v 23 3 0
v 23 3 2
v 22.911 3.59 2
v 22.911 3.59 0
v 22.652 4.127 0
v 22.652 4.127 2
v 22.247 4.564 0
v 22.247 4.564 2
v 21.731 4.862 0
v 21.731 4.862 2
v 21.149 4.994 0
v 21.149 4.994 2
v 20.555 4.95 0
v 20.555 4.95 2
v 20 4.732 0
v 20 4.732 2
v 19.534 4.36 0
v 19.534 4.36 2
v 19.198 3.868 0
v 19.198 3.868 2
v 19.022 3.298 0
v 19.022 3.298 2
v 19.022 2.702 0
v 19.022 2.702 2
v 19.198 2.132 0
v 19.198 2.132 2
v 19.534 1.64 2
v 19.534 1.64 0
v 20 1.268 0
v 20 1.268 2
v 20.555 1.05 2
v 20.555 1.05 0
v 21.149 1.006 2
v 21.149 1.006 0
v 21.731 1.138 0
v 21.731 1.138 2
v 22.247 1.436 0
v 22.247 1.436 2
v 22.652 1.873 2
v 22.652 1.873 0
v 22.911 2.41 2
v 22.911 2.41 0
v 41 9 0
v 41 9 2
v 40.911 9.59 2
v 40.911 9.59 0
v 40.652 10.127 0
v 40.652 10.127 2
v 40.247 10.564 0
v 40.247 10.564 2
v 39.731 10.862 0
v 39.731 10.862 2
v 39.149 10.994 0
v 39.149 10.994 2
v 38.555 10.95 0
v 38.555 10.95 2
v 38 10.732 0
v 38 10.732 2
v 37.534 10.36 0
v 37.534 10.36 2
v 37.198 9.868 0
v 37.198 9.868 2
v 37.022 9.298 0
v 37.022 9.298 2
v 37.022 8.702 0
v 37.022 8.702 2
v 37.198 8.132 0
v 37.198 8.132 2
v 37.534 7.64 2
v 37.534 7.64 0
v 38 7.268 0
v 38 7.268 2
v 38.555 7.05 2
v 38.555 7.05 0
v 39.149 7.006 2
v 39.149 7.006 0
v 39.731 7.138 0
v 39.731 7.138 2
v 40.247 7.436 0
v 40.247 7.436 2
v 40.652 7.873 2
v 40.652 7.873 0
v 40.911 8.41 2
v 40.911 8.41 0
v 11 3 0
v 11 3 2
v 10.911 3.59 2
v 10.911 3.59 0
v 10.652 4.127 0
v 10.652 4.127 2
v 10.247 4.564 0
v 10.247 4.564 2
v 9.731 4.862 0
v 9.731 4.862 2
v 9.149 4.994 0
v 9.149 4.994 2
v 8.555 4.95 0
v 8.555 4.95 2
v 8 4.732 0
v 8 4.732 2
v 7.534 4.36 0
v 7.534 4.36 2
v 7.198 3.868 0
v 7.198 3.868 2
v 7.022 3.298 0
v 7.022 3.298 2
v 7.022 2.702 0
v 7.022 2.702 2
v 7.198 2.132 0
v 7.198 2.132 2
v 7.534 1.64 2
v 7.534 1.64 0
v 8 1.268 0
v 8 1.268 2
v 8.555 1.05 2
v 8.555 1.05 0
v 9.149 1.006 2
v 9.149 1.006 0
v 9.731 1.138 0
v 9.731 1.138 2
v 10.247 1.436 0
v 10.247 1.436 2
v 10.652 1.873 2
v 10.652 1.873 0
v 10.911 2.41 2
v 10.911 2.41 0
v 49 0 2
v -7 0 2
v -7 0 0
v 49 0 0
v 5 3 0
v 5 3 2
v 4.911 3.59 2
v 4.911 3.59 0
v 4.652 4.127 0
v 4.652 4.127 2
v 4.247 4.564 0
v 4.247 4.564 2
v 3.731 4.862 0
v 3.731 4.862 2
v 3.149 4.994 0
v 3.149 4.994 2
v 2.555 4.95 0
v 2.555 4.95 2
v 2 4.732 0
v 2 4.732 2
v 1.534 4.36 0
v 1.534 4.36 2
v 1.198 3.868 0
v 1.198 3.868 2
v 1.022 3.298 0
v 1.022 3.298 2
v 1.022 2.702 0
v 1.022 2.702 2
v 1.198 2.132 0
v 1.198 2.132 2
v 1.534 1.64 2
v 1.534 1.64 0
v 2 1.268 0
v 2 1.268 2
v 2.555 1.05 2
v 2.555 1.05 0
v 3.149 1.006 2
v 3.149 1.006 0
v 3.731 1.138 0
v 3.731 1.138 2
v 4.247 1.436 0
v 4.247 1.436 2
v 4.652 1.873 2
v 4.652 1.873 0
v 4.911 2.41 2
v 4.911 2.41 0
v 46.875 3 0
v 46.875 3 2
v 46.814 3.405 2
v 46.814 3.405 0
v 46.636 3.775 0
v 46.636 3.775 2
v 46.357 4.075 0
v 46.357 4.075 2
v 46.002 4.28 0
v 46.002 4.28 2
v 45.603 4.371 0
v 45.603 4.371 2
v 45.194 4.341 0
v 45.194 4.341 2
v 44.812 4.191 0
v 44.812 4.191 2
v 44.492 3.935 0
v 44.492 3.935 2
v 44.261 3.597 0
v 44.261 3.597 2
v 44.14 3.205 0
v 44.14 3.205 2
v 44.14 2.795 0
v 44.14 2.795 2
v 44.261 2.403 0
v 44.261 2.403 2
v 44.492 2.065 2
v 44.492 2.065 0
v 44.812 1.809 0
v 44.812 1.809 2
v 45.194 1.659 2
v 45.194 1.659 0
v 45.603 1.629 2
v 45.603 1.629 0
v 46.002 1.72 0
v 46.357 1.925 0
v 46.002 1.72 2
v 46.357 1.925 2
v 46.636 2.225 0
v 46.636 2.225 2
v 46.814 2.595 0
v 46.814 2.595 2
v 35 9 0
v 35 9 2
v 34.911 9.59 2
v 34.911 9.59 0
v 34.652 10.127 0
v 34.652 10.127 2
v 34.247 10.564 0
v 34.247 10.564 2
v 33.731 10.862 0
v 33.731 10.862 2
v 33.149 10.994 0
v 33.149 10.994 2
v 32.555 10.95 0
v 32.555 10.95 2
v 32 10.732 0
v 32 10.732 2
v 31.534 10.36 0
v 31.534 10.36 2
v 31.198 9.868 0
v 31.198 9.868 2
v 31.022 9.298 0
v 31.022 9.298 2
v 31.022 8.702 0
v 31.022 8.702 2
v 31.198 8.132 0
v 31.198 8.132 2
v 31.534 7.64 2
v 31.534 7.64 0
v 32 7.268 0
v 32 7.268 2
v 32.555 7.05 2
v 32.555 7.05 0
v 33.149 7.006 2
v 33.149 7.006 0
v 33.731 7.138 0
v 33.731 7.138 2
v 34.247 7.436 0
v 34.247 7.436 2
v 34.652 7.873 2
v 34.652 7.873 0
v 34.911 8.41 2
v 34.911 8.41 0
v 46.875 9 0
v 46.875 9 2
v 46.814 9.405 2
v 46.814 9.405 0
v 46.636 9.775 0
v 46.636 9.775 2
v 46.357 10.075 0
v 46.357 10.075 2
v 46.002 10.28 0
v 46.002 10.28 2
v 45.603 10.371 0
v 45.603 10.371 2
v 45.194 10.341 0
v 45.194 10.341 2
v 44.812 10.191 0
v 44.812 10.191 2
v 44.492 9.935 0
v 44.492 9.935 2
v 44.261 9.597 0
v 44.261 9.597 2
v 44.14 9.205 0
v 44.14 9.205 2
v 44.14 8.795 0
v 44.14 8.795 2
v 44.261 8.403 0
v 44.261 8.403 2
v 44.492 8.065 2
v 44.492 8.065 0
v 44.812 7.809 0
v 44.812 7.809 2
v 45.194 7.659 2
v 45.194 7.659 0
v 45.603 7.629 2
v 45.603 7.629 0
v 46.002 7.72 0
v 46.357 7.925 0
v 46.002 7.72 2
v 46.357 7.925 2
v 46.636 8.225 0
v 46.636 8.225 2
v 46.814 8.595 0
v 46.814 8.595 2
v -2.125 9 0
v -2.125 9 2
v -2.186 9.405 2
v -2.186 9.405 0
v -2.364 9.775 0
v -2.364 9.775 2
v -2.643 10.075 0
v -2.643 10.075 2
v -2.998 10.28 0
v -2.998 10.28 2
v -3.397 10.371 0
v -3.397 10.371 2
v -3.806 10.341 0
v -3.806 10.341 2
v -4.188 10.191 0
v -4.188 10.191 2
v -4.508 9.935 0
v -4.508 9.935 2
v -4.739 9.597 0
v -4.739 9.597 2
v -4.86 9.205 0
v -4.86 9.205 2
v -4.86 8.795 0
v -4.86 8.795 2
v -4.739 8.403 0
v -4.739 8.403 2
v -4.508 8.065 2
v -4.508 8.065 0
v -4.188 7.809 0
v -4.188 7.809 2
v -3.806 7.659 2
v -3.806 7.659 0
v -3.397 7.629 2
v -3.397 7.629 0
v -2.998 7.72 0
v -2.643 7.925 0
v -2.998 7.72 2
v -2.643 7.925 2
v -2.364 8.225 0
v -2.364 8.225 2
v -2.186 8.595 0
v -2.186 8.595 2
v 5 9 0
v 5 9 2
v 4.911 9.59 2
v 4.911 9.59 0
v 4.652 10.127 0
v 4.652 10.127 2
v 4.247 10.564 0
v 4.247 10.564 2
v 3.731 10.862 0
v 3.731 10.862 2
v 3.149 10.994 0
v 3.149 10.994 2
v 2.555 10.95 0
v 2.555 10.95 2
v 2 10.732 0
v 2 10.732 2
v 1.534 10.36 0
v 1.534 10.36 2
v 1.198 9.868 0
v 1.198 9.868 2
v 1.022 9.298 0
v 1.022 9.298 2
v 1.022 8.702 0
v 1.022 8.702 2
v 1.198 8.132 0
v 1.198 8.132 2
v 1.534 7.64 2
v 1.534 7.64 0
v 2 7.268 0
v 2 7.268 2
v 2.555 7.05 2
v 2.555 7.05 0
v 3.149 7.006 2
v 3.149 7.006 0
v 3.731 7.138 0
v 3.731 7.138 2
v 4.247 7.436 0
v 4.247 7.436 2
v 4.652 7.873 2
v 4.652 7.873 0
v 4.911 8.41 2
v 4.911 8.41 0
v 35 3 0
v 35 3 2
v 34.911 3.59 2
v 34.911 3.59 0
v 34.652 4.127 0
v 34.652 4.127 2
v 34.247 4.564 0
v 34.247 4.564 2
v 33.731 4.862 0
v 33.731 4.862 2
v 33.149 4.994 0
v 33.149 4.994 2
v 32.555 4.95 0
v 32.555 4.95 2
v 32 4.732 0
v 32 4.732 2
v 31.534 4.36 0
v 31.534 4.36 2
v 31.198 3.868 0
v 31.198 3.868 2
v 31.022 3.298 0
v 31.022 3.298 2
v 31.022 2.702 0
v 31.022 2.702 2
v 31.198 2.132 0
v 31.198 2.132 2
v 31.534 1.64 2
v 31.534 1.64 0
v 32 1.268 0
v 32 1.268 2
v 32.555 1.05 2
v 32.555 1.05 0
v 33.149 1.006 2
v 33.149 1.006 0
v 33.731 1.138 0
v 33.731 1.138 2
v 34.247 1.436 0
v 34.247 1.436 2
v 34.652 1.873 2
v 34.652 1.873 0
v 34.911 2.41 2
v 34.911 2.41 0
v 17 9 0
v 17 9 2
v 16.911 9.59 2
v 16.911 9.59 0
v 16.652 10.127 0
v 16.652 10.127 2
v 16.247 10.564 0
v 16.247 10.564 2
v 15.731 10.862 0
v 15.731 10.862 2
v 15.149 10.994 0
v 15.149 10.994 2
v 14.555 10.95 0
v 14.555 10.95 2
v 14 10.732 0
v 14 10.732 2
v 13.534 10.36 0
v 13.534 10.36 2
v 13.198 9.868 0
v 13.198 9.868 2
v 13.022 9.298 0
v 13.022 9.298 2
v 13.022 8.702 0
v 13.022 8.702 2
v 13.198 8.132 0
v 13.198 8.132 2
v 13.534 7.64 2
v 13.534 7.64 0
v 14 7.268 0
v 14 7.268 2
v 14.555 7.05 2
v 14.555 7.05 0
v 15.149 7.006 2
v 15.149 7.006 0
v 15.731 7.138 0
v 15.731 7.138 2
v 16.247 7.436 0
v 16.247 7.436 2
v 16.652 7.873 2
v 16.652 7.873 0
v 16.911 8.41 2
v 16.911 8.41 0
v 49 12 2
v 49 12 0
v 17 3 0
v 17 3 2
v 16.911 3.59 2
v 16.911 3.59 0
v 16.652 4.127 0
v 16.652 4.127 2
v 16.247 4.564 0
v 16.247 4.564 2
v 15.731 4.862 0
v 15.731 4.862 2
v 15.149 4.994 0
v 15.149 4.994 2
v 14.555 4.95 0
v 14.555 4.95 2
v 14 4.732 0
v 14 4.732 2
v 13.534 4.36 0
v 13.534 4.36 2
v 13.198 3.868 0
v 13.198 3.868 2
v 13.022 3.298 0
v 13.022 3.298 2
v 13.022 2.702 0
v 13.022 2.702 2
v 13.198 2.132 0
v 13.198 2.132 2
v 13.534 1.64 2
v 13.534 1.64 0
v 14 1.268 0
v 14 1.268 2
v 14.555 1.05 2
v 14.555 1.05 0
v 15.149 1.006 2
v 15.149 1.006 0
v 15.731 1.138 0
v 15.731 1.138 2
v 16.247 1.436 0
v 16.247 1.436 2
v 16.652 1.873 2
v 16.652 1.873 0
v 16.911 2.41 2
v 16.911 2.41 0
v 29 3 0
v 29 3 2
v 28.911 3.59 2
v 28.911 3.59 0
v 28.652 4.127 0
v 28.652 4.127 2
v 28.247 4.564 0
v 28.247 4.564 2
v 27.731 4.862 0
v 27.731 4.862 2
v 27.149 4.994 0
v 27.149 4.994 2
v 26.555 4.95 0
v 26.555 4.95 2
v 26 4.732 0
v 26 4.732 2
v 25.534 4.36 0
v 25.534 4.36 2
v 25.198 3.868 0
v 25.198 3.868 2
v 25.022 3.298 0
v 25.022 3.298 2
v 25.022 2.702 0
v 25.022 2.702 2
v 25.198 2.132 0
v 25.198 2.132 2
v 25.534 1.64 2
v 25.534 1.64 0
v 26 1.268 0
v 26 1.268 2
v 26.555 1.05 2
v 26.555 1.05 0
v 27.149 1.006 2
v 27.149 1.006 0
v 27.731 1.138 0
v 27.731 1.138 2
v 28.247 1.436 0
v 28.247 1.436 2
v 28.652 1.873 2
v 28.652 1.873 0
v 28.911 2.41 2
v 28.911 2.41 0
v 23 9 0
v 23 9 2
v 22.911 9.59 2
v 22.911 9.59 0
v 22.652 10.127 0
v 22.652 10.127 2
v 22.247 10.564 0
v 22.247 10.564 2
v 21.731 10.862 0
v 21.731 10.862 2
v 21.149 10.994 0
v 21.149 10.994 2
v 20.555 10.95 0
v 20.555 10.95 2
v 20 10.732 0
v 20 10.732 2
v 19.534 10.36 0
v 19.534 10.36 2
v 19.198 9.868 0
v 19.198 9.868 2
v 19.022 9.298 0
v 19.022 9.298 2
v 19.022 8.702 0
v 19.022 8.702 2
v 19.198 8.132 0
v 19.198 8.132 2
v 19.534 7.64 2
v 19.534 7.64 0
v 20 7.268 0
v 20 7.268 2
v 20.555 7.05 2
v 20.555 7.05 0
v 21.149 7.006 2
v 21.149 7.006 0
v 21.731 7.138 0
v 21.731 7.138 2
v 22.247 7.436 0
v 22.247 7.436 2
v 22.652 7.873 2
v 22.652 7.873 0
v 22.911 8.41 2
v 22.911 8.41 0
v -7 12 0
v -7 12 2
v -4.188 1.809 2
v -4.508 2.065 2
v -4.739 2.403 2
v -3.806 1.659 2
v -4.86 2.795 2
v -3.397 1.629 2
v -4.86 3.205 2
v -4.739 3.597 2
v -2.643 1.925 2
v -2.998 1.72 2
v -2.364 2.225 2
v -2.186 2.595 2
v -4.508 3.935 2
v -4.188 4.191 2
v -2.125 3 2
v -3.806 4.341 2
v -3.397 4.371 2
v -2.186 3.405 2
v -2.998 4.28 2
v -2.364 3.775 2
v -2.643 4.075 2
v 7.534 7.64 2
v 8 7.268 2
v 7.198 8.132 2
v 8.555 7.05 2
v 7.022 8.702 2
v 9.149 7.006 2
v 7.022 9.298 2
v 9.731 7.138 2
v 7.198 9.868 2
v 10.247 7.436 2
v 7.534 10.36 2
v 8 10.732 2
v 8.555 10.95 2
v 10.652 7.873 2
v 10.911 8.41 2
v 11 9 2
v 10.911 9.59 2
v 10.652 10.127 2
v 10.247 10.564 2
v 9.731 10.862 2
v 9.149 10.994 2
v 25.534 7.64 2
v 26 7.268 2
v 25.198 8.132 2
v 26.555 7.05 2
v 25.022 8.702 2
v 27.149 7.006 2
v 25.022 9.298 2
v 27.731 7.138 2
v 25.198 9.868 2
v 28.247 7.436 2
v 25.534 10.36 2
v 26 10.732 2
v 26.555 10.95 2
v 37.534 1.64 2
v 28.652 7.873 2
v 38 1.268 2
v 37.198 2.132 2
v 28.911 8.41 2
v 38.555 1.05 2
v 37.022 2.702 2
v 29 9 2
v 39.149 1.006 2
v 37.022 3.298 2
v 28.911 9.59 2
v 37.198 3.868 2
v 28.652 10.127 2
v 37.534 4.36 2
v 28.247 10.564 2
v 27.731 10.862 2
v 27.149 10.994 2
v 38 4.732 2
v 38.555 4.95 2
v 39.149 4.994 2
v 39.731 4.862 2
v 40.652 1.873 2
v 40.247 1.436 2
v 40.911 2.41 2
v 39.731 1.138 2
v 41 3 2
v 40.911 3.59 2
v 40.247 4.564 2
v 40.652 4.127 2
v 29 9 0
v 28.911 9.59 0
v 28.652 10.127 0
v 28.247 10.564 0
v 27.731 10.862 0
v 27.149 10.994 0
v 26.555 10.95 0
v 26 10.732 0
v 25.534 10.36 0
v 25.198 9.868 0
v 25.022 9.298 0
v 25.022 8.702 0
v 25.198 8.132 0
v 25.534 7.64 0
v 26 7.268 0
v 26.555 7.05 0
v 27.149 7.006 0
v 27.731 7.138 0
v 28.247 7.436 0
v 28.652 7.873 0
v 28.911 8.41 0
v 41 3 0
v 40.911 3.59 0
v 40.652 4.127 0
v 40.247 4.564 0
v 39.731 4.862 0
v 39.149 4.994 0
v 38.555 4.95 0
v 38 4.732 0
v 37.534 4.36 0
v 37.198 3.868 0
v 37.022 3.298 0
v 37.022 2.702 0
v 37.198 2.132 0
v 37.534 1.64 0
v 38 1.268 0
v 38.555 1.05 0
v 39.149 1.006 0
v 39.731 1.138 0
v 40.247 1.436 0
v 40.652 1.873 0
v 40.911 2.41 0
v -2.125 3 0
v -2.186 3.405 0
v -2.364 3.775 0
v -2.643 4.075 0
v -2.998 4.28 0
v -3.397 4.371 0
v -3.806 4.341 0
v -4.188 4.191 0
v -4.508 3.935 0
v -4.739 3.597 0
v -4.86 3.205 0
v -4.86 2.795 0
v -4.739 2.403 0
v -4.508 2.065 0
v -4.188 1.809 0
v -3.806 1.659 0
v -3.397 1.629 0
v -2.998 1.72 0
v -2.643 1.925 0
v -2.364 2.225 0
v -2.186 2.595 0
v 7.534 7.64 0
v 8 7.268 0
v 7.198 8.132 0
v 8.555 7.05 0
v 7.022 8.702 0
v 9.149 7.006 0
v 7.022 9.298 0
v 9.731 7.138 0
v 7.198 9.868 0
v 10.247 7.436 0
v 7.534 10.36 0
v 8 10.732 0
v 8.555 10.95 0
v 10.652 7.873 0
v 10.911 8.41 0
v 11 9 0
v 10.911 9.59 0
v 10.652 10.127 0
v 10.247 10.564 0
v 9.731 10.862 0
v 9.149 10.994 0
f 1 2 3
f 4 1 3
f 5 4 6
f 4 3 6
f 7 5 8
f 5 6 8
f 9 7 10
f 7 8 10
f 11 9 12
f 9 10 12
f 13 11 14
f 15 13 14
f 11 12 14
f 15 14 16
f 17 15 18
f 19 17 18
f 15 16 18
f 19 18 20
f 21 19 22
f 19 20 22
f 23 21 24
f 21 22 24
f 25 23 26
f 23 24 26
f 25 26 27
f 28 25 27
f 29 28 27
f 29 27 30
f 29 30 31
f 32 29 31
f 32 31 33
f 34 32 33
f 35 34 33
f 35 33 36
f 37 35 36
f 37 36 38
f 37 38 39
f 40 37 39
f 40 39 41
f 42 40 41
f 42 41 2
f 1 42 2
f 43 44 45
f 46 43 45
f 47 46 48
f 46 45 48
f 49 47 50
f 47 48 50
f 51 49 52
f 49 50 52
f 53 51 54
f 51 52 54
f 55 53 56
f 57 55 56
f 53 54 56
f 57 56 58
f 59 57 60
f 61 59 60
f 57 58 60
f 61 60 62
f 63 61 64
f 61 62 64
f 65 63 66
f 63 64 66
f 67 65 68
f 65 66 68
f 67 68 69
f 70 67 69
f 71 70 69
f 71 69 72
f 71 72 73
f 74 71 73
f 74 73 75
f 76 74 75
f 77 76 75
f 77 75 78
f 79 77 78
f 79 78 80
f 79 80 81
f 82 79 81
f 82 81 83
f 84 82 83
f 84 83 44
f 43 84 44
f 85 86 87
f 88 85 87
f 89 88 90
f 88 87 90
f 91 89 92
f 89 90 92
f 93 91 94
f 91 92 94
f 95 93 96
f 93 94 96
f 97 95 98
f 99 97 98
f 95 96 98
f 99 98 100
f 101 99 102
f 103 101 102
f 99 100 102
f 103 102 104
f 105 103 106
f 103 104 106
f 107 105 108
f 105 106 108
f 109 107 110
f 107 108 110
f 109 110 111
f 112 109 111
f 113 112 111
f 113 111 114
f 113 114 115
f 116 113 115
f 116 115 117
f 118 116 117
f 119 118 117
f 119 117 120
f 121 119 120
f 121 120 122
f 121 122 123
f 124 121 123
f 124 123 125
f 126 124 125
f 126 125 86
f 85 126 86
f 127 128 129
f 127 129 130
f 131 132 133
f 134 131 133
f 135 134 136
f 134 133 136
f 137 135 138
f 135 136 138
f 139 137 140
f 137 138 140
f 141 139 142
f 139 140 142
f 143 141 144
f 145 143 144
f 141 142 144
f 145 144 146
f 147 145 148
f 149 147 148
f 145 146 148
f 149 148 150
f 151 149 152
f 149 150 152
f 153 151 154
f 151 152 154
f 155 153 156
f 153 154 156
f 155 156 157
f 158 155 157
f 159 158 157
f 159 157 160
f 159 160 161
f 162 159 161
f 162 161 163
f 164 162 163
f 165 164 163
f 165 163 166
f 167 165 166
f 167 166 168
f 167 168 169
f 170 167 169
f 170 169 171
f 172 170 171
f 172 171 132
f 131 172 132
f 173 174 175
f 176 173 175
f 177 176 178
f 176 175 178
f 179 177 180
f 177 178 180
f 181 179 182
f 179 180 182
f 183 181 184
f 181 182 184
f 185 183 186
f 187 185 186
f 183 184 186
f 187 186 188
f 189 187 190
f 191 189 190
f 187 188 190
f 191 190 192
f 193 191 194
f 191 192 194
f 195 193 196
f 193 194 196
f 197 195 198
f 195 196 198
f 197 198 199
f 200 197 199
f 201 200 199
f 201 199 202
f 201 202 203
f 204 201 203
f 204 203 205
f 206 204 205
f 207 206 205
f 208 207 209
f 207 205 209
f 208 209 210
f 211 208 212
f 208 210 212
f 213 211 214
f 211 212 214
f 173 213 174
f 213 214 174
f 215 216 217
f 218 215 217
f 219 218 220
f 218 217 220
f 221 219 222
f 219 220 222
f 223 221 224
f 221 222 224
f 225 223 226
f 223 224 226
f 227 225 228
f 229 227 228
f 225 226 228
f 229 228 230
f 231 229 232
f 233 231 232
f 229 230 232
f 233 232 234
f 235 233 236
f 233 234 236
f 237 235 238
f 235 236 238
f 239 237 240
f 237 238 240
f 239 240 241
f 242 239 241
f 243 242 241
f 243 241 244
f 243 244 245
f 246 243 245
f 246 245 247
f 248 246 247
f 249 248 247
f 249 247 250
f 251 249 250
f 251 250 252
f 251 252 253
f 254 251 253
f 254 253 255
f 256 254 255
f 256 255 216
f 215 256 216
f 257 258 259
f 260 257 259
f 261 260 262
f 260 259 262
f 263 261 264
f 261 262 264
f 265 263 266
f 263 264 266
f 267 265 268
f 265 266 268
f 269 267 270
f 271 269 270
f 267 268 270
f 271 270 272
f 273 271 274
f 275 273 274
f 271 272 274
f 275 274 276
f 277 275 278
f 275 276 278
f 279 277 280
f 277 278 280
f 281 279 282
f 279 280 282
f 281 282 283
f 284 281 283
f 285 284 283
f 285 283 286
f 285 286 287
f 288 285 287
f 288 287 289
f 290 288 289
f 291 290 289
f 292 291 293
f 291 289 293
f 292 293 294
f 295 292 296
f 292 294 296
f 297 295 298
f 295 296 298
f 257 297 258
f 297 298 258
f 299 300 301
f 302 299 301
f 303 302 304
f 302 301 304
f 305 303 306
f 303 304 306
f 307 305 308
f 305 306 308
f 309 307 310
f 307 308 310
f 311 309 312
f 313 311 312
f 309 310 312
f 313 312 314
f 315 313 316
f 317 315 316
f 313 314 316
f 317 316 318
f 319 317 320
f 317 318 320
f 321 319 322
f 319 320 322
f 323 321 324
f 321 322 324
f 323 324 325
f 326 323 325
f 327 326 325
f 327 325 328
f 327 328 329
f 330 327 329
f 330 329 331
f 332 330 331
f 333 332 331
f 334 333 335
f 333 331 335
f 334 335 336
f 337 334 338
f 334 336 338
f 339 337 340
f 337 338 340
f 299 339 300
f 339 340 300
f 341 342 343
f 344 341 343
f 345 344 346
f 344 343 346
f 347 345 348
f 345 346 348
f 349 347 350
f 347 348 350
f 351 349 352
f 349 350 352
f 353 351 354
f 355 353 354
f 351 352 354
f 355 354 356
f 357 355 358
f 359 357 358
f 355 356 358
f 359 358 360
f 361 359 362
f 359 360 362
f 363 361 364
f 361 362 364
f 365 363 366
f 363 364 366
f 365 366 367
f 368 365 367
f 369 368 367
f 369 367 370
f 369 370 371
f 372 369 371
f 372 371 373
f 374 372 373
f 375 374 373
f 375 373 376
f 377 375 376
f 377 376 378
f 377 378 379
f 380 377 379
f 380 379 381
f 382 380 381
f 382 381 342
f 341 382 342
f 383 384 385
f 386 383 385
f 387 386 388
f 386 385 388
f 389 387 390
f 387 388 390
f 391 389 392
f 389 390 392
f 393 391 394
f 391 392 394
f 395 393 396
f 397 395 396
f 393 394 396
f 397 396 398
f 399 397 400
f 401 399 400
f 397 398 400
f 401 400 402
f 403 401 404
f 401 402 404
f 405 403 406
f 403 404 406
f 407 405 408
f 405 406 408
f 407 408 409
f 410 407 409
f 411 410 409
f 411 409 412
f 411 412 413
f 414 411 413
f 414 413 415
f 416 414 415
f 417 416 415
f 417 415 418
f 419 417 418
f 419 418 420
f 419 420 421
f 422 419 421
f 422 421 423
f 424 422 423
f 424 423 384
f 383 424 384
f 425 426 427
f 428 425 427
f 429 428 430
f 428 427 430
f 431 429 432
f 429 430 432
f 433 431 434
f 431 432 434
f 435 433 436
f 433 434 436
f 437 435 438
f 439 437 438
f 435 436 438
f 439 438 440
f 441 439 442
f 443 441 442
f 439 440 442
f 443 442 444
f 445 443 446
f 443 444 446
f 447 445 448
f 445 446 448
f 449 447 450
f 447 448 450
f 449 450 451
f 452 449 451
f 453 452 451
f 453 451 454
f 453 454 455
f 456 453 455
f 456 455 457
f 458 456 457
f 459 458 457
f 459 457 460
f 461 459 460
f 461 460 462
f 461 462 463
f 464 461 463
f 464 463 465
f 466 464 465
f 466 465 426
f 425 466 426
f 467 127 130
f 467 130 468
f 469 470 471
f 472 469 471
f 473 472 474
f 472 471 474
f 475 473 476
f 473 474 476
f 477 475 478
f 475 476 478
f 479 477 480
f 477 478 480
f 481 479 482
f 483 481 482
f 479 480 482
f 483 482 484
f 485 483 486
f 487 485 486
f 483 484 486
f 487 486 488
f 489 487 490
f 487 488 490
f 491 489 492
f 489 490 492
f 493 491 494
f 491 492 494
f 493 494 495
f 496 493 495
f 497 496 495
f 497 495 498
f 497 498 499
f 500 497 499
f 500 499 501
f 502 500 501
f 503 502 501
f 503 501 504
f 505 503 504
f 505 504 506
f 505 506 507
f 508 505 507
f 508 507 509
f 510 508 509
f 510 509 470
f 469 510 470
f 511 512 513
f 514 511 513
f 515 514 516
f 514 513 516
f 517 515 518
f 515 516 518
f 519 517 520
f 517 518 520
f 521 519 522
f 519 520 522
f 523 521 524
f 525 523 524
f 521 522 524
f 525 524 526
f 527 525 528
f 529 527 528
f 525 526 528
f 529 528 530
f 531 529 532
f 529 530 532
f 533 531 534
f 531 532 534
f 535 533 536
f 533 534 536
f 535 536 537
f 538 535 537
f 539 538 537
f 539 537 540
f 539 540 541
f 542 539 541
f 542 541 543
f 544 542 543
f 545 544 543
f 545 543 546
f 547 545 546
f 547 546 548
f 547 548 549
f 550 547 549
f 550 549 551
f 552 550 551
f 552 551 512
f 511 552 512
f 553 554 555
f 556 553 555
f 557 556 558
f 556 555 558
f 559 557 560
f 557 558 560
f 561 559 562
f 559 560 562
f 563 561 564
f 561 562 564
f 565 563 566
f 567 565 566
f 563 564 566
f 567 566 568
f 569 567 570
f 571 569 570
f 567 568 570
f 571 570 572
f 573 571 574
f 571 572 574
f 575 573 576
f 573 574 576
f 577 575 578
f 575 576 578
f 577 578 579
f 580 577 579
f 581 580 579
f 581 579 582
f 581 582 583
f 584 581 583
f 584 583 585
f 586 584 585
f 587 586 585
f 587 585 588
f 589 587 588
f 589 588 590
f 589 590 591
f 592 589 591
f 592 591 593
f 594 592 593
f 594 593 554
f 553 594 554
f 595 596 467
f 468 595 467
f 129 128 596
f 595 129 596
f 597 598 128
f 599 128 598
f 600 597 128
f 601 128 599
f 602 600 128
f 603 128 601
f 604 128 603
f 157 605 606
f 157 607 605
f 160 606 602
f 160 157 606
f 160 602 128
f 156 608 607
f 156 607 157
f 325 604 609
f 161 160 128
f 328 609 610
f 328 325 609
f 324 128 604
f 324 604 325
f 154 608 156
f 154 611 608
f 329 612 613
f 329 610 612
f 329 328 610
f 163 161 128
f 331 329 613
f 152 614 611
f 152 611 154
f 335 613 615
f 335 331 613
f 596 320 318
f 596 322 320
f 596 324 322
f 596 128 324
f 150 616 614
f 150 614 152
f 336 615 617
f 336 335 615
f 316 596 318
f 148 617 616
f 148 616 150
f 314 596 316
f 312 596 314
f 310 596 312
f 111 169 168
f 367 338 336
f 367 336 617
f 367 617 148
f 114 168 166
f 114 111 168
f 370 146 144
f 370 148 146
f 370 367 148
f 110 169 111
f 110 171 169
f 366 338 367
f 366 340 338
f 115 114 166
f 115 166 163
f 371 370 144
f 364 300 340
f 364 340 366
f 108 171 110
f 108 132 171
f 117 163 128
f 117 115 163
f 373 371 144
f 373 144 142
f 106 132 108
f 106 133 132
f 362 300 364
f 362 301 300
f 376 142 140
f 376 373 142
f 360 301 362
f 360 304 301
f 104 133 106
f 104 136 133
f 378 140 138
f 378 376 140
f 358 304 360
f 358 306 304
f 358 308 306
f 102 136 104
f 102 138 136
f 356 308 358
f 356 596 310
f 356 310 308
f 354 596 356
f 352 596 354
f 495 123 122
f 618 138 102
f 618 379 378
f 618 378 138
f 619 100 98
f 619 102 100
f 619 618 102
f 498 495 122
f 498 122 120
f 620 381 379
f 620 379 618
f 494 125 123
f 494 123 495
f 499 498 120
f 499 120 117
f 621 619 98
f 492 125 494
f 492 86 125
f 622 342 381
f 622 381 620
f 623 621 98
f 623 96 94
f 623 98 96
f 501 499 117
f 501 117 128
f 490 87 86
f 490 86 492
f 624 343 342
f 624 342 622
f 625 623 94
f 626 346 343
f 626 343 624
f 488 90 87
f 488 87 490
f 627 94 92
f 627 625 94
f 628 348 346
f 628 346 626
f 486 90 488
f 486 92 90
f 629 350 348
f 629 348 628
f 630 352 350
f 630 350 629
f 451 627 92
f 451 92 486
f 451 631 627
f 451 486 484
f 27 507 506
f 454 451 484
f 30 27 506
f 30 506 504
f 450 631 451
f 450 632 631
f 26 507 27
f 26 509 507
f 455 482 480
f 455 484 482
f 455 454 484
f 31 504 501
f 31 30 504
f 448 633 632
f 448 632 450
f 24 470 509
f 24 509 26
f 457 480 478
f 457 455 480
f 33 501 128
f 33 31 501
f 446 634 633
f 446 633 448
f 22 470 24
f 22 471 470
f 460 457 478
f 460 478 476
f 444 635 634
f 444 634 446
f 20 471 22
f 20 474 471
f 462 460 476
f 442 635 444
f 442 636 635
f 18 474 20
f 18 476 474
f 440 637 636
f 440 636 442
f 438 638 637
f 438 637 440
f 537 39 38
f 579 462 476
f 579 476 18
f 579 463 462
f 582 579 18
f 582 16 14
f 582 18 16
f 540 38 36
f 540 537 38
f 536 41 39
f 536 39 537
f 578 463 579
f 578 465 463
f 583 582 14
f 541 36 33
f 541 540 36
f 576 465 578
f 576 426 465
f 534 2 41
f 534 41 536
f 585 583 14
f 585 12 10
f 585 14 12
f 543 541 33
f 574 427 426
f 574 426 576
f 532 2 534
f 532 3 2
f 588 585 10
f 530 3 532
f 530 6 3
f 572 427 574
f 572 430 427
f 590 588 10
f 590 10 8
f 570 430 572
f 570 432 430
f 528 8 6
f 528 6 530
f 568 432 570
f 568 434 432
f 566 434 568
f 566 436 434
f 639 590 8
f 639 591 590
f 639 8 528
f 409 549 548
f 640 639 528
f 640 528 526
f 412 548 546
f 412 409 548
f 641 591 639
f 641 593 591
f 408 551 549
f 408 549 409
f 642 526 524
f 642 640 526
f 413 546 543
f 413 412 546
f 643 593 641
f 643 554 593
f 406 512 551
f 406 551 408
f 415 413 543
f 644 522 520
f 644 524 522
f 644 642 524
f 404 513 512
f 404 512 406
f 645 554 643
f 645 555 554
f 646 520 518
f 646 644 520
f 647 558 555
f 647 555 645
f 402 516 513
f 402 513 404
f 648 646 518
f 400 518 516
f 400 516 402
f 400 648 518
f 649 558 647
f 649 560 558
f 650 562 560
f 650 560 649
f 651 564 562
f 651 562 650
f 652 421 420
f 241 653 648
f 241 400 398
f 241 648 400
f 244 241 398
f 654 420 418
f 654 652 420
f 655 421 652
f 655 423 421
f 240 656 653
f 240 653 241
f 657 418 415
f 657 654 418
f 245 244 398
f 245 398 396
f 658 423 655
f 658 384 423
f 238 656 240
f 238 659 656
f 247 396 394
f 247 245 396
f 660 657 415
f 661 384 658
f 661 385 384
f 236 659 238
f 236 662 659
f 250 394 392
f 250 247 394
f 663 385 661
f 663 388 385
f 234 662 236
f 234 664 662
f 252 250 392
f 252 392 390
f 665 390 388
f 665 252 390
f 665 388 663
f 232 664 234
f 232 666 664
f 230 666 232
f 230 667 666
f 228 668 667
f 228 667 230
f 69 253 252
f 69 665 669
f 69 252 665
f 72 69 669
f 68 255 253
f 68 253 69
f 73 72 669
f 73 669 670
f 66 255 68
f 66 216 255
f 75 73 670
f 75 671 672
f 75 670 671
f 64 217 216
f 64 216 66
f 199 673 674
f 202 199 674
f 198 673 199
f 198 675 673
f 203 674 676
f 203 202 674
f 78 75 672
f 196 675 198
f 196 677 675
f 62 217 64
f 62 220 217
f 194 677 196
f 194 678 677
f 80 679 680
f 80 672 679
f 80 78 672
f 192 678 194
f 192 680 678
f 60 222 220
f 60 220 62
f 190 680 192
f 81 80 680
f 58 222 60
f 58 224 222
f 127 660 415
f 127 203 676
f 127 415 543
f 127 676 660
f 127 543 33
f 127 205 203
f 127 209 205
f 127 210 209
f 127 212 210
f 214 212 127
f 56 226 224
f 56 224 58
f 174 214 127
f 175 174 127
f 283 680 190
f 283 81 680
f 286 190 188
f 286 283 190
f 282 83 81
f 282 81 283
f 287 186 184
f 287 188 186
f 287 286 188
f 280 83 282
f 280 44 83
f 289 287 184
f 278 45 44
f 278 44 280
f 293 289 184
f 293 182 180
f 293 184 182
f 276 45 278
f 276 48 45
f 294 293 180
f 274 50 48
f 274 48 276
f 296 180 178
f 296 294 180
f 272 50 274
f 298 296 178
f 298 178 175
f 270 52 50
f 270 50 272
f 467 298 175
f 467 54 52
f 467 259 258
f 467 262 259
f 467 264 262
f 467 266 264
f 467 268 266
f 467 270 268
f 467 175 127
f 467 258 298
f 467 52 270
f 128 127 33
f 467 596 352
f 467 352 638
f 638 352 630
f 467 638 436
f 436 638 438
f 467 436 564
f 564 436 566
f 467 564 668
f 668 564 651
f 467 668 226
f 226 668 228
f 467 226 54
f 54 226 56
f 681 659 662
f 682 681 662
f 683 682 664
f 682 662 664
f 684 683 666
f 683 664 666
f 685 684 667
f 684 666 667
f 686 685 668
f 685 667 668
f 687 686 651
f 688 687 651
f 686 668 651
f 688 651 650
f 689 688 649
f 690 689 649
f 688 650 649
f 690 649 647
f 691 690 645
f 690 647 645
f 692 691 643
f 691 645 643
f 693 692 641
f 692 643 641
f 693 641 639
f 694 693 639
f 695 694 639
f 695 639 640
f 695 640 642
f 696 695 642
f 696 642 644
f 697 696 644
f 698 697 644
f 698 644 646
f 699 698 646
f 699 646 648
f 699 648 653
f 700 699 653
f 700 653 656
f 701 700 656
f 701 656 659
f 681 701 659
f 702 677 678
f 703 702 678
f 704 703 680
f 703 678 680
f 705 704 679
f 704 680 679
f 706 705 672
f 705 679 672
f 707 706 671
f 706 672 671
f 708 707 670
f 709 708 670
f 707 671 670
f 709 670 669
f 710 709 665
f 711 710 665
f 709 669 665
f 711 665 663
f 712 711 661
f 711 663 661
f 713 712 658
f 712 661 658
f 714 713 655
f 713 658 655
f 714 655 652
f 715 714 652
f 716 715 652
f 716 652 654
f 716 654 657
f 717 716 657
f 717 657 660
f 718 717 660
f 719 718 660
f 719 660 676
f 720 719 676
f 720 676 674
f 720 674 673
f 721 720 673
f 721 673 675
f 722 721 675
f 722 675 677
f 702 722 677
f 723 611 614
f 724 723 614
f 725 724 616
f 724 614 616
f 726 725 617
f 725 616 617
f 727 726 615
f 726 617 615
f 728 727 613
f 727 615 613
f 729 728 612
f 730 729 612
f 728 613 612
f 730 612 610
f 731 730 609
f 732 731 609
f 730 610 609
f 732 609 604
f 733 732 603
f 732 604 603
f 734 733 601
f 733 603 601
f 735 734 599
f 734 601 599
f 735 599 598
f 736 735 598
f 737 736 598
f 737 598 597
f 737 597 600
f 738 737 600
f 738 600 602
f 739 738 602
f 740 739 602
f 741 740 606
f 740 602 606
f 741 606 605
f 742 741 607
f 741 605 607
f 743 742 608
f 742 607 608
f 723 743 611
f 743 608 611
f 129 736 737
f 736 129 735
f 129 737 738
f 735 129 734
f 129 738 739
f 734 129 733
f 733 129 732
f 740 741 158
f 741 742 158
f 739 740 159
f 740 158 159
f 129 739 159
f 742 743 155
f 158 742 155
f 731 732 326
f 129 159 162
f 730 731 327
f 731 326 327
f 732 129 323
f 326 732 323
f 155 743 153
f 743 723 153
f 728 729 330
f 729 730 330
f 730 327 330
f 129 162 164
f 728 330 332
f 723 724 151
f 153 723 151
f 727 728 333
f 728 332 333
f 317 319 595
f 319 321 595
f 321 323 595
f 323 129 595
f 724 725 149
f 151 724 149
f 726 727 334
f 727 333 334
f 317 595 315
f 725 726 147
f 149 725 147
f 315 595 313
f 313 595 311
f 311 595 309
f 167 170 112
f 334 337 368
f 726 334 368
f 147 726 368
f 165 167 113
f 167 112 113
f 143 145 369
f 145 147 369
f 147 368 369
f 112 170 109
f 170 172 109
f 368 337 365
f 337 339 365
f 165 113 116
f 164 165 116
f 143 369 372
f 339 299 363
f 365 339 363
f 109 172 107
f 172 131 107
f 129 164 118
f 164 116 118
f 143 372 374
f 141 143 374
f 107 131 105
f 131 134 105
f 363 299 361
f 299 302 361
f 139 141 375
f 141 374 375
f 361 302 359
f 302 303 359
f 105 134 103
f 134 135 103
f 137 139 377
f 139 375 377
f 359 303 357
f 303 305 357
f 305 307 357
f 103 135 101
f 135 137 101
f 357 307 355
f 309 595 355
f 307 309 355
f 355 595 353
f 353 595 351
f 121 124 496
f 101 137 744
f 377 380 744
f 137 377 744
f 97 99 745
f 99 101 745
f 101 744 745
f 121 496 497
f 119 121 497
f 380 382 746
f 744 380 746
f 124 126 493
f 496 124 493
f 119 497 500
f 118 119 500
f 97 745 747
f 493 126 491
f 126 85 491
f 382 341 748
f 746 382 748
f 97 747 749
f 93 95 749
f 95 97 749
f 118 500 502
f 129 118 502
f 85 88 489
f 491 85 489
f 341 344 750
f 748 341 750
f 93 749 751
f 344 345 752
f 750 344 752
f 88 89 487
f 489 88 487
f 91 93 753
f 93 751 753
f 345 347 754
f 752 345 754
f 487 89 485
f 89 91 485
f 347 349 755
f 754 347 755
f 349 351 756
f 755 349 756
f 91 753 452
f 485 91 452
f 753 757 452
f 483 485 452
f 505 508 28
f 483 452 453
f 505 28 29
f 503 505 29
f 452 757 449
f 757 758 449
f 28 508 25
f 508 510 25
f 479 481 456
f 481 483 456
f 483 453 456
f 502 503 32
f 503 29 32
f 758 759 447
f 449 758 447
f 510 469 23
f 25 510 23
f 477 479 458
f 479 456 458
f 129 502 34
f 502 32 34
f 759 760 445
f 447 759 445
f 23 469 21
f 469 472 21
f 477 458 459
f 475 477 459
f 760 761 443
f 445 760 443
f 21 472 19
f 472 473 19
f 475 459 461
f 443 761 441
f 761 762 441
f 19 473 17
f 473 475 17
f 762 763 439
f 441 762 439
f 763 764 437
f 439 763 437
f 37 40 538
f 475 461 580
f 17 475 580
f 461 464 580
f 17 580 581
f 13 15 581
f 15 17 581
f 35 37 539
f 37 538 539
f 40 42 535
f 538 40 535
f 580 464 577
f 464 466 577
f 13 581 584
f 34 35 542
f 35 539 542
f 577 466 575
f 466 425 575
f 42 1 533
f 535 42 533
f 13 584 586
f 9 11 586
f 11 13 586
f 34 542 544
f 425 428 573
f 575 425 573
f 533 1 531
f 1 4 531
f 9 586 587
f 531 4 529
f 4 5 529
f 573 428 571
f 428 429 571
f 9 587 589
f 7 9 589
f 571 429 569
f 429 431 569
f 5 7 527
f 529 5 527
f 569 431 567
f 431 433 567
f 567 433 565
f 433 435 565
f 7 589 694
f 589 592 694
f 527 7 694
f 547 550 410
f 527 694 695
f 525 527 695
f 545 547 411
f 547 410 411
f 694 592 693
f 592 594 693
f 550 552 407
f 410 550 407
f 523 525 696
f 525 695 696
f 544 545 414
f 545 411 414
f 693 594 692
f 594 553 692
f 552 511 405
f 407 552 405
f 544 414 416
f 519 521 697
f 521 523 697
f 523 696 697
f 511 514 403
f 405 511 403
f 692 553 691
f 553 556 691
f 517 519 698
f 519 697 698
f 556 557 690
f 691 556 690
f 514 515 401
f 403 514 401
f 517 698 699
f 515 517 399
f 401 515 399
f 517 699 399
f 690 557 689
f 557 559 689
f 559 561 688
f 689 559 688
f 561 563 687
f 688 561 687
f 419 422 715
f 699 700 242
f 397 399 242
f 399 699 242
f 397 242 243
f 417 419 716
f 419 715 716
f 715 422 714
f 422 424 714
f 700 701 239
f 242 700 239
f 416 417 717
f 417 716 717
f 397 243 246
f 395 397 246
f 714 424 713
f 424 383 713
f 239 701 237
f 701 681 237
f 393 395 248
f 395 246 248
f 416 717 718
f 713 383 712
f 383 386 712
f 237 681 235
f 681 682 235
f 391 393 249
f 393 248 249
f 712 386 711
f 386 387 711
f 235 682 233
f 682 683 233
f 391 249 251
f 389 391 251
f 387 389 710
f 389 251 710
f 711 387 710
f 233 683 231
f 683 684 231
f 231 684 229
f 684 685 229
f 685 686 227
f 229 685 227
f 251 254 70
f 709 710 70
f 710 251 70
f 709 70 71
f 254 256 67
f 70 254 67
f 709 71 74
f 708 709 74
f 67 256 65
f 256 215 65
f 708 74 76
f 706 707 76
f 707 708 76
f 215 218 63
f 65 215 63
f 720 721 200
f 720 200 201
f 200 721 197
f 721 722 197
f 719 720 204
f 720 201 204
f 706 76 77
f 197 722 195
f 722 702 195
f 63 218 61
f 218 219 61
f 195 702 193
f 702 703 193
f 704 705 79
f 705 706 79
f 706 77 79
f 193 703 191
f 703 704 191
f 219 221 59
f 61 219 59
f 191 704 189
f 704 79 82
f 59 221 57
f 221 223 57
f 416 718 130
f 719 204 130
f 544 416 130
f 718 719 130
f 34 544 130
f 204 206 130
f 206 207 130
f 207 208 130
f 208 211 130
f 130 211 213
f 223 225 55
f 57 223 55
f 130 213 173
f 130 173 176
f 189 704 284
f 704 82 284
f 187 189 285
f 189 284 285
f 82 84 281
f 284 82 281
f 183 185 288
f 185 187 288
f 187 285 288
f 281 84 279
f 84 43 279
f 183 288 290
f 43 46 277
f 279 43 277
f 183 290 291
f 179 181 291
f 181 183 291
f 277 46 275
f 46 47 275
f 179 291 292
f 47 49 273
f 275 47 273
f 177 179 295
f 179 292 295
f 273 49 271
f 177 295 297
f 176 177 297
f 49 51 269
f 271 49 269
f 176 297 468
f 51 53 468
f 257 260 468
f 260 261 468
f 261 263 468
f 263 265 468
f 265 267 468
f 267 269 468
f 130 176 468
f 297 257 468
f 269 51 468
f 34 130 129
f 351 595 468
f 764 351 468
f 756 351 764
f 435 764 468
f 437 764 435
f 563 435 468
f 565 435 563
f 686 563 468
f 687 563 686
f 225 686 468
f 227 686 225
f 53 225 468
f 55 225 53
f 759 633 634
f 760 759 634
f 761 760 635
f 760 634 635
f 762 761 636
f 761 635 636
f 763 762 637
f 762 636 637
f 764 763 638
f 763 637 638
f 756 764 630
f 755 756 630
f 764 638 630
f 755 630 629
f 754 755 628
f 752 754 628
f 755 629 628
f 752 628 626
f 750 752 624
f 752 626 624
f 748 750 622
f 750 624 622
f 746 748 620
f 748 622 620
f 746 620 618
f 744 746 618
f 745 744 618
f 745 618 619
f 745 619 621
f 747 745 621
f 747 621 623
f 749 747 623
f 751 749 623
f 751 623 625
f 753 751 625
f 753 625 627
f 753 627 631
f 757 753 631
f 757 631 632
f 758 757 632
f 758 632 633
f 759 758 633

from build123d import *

# Parameters (mm, degrees)
SKETCH1_W           = 42
SKETCH1_H           = 12
TAILLIGHTBASE_DEPTH = 2
SKETCH3_W           = 7
SKETCH3_H           = 12
MOUNTINGTABS_DEPTH  = 2
SKETCH4_R           = 1.375
MOUNTINGHOLES_DEPTH = 2
SKETCH5_R           = 2
CUT_EXTRUDE1_DEPTH  = 10


with BuildPart() as part:
    # Sketch1 → tailLightBase (new body)
    with BuildSketch(Plane.XY):
        with Locations((21, 6)):
            Rectangle(SKETCH1_W, SKETCH1_H)
    extrude(amount=TAILLIGHTBASE_DEPTH)

    # Sketch3 → mountingTabs (add)
    with BuildSketch(Plane.XY.offset(2)):
        with Locations((-3.5, 6)):
            Rectangle(SKETCH3_W, SKETCH3_H)
        with Locations((45.5, 6)):
            Rectangle(SKETCH3_W, SKETCH3_H)
    extrude(amount=-MOUNTINGTABS_DEPTH)

    # Sketch4 → mountingHoles (cut)
    with BuildSketch(Plane.XY.offset(2)):
        with Locations((-3.5, 9)):
            Circle(SKETCH4_R)
        with Locations((45.5, 9)):
            Circle(SKETCH4_R)
        with Locations((-3.5, 3)):
            Circle(SKETCH4_R)
        with Locations((45.5, 3)):
            Circle(SKETCH4_R)
    extrude(amount=-MOUNTINGHOLES_DEPTH, mode=Mode.SUBTRACT)

    # Sketch5 → Cut-Extrude1 (cut)
    with BuildSketch(Plane.XY.offset(2)):
        with Locations((3, 9)):
            Circle(SKETCH5_R)
        with Locations((9, 9)):
            Circle(SKETCH5_R)
        with Locations((15, 9)):
            Circle(SKETCH5_R)
        with Locations((21, 9)):
            Circle(SKETCH5_R)
        with Locations((27, 9)):
            Circle(SKETCH5_R)
        with Locations((33, 9)):
            Circle(SKETCH5_R)
        with Locations((39, 9)):
            Circle(SKETCH5_R)
        with Locations((39, 3)):
            Circle(SKETCH5_R)
        with Locations((33, 3)):
            Circle(SKETCH5_R)
        with Locations((27, 3)):
            Circle(SKETCH5_R)
        with Locations((21, 3)):
            Circle(SKETCH5_R)
        with Locations((15, 3)):
            Circle(SKETCH5_R)
        with Locations((9, 3)):
            Circle(SKETCH5_R)
        with Locations((3, 3)):
            Circle(SKETCH5_R)
    extrude(amount=-CUT_EXTRUDE1_DEPTH, mode=Mode.SUBTRACT)


solid = part.part
